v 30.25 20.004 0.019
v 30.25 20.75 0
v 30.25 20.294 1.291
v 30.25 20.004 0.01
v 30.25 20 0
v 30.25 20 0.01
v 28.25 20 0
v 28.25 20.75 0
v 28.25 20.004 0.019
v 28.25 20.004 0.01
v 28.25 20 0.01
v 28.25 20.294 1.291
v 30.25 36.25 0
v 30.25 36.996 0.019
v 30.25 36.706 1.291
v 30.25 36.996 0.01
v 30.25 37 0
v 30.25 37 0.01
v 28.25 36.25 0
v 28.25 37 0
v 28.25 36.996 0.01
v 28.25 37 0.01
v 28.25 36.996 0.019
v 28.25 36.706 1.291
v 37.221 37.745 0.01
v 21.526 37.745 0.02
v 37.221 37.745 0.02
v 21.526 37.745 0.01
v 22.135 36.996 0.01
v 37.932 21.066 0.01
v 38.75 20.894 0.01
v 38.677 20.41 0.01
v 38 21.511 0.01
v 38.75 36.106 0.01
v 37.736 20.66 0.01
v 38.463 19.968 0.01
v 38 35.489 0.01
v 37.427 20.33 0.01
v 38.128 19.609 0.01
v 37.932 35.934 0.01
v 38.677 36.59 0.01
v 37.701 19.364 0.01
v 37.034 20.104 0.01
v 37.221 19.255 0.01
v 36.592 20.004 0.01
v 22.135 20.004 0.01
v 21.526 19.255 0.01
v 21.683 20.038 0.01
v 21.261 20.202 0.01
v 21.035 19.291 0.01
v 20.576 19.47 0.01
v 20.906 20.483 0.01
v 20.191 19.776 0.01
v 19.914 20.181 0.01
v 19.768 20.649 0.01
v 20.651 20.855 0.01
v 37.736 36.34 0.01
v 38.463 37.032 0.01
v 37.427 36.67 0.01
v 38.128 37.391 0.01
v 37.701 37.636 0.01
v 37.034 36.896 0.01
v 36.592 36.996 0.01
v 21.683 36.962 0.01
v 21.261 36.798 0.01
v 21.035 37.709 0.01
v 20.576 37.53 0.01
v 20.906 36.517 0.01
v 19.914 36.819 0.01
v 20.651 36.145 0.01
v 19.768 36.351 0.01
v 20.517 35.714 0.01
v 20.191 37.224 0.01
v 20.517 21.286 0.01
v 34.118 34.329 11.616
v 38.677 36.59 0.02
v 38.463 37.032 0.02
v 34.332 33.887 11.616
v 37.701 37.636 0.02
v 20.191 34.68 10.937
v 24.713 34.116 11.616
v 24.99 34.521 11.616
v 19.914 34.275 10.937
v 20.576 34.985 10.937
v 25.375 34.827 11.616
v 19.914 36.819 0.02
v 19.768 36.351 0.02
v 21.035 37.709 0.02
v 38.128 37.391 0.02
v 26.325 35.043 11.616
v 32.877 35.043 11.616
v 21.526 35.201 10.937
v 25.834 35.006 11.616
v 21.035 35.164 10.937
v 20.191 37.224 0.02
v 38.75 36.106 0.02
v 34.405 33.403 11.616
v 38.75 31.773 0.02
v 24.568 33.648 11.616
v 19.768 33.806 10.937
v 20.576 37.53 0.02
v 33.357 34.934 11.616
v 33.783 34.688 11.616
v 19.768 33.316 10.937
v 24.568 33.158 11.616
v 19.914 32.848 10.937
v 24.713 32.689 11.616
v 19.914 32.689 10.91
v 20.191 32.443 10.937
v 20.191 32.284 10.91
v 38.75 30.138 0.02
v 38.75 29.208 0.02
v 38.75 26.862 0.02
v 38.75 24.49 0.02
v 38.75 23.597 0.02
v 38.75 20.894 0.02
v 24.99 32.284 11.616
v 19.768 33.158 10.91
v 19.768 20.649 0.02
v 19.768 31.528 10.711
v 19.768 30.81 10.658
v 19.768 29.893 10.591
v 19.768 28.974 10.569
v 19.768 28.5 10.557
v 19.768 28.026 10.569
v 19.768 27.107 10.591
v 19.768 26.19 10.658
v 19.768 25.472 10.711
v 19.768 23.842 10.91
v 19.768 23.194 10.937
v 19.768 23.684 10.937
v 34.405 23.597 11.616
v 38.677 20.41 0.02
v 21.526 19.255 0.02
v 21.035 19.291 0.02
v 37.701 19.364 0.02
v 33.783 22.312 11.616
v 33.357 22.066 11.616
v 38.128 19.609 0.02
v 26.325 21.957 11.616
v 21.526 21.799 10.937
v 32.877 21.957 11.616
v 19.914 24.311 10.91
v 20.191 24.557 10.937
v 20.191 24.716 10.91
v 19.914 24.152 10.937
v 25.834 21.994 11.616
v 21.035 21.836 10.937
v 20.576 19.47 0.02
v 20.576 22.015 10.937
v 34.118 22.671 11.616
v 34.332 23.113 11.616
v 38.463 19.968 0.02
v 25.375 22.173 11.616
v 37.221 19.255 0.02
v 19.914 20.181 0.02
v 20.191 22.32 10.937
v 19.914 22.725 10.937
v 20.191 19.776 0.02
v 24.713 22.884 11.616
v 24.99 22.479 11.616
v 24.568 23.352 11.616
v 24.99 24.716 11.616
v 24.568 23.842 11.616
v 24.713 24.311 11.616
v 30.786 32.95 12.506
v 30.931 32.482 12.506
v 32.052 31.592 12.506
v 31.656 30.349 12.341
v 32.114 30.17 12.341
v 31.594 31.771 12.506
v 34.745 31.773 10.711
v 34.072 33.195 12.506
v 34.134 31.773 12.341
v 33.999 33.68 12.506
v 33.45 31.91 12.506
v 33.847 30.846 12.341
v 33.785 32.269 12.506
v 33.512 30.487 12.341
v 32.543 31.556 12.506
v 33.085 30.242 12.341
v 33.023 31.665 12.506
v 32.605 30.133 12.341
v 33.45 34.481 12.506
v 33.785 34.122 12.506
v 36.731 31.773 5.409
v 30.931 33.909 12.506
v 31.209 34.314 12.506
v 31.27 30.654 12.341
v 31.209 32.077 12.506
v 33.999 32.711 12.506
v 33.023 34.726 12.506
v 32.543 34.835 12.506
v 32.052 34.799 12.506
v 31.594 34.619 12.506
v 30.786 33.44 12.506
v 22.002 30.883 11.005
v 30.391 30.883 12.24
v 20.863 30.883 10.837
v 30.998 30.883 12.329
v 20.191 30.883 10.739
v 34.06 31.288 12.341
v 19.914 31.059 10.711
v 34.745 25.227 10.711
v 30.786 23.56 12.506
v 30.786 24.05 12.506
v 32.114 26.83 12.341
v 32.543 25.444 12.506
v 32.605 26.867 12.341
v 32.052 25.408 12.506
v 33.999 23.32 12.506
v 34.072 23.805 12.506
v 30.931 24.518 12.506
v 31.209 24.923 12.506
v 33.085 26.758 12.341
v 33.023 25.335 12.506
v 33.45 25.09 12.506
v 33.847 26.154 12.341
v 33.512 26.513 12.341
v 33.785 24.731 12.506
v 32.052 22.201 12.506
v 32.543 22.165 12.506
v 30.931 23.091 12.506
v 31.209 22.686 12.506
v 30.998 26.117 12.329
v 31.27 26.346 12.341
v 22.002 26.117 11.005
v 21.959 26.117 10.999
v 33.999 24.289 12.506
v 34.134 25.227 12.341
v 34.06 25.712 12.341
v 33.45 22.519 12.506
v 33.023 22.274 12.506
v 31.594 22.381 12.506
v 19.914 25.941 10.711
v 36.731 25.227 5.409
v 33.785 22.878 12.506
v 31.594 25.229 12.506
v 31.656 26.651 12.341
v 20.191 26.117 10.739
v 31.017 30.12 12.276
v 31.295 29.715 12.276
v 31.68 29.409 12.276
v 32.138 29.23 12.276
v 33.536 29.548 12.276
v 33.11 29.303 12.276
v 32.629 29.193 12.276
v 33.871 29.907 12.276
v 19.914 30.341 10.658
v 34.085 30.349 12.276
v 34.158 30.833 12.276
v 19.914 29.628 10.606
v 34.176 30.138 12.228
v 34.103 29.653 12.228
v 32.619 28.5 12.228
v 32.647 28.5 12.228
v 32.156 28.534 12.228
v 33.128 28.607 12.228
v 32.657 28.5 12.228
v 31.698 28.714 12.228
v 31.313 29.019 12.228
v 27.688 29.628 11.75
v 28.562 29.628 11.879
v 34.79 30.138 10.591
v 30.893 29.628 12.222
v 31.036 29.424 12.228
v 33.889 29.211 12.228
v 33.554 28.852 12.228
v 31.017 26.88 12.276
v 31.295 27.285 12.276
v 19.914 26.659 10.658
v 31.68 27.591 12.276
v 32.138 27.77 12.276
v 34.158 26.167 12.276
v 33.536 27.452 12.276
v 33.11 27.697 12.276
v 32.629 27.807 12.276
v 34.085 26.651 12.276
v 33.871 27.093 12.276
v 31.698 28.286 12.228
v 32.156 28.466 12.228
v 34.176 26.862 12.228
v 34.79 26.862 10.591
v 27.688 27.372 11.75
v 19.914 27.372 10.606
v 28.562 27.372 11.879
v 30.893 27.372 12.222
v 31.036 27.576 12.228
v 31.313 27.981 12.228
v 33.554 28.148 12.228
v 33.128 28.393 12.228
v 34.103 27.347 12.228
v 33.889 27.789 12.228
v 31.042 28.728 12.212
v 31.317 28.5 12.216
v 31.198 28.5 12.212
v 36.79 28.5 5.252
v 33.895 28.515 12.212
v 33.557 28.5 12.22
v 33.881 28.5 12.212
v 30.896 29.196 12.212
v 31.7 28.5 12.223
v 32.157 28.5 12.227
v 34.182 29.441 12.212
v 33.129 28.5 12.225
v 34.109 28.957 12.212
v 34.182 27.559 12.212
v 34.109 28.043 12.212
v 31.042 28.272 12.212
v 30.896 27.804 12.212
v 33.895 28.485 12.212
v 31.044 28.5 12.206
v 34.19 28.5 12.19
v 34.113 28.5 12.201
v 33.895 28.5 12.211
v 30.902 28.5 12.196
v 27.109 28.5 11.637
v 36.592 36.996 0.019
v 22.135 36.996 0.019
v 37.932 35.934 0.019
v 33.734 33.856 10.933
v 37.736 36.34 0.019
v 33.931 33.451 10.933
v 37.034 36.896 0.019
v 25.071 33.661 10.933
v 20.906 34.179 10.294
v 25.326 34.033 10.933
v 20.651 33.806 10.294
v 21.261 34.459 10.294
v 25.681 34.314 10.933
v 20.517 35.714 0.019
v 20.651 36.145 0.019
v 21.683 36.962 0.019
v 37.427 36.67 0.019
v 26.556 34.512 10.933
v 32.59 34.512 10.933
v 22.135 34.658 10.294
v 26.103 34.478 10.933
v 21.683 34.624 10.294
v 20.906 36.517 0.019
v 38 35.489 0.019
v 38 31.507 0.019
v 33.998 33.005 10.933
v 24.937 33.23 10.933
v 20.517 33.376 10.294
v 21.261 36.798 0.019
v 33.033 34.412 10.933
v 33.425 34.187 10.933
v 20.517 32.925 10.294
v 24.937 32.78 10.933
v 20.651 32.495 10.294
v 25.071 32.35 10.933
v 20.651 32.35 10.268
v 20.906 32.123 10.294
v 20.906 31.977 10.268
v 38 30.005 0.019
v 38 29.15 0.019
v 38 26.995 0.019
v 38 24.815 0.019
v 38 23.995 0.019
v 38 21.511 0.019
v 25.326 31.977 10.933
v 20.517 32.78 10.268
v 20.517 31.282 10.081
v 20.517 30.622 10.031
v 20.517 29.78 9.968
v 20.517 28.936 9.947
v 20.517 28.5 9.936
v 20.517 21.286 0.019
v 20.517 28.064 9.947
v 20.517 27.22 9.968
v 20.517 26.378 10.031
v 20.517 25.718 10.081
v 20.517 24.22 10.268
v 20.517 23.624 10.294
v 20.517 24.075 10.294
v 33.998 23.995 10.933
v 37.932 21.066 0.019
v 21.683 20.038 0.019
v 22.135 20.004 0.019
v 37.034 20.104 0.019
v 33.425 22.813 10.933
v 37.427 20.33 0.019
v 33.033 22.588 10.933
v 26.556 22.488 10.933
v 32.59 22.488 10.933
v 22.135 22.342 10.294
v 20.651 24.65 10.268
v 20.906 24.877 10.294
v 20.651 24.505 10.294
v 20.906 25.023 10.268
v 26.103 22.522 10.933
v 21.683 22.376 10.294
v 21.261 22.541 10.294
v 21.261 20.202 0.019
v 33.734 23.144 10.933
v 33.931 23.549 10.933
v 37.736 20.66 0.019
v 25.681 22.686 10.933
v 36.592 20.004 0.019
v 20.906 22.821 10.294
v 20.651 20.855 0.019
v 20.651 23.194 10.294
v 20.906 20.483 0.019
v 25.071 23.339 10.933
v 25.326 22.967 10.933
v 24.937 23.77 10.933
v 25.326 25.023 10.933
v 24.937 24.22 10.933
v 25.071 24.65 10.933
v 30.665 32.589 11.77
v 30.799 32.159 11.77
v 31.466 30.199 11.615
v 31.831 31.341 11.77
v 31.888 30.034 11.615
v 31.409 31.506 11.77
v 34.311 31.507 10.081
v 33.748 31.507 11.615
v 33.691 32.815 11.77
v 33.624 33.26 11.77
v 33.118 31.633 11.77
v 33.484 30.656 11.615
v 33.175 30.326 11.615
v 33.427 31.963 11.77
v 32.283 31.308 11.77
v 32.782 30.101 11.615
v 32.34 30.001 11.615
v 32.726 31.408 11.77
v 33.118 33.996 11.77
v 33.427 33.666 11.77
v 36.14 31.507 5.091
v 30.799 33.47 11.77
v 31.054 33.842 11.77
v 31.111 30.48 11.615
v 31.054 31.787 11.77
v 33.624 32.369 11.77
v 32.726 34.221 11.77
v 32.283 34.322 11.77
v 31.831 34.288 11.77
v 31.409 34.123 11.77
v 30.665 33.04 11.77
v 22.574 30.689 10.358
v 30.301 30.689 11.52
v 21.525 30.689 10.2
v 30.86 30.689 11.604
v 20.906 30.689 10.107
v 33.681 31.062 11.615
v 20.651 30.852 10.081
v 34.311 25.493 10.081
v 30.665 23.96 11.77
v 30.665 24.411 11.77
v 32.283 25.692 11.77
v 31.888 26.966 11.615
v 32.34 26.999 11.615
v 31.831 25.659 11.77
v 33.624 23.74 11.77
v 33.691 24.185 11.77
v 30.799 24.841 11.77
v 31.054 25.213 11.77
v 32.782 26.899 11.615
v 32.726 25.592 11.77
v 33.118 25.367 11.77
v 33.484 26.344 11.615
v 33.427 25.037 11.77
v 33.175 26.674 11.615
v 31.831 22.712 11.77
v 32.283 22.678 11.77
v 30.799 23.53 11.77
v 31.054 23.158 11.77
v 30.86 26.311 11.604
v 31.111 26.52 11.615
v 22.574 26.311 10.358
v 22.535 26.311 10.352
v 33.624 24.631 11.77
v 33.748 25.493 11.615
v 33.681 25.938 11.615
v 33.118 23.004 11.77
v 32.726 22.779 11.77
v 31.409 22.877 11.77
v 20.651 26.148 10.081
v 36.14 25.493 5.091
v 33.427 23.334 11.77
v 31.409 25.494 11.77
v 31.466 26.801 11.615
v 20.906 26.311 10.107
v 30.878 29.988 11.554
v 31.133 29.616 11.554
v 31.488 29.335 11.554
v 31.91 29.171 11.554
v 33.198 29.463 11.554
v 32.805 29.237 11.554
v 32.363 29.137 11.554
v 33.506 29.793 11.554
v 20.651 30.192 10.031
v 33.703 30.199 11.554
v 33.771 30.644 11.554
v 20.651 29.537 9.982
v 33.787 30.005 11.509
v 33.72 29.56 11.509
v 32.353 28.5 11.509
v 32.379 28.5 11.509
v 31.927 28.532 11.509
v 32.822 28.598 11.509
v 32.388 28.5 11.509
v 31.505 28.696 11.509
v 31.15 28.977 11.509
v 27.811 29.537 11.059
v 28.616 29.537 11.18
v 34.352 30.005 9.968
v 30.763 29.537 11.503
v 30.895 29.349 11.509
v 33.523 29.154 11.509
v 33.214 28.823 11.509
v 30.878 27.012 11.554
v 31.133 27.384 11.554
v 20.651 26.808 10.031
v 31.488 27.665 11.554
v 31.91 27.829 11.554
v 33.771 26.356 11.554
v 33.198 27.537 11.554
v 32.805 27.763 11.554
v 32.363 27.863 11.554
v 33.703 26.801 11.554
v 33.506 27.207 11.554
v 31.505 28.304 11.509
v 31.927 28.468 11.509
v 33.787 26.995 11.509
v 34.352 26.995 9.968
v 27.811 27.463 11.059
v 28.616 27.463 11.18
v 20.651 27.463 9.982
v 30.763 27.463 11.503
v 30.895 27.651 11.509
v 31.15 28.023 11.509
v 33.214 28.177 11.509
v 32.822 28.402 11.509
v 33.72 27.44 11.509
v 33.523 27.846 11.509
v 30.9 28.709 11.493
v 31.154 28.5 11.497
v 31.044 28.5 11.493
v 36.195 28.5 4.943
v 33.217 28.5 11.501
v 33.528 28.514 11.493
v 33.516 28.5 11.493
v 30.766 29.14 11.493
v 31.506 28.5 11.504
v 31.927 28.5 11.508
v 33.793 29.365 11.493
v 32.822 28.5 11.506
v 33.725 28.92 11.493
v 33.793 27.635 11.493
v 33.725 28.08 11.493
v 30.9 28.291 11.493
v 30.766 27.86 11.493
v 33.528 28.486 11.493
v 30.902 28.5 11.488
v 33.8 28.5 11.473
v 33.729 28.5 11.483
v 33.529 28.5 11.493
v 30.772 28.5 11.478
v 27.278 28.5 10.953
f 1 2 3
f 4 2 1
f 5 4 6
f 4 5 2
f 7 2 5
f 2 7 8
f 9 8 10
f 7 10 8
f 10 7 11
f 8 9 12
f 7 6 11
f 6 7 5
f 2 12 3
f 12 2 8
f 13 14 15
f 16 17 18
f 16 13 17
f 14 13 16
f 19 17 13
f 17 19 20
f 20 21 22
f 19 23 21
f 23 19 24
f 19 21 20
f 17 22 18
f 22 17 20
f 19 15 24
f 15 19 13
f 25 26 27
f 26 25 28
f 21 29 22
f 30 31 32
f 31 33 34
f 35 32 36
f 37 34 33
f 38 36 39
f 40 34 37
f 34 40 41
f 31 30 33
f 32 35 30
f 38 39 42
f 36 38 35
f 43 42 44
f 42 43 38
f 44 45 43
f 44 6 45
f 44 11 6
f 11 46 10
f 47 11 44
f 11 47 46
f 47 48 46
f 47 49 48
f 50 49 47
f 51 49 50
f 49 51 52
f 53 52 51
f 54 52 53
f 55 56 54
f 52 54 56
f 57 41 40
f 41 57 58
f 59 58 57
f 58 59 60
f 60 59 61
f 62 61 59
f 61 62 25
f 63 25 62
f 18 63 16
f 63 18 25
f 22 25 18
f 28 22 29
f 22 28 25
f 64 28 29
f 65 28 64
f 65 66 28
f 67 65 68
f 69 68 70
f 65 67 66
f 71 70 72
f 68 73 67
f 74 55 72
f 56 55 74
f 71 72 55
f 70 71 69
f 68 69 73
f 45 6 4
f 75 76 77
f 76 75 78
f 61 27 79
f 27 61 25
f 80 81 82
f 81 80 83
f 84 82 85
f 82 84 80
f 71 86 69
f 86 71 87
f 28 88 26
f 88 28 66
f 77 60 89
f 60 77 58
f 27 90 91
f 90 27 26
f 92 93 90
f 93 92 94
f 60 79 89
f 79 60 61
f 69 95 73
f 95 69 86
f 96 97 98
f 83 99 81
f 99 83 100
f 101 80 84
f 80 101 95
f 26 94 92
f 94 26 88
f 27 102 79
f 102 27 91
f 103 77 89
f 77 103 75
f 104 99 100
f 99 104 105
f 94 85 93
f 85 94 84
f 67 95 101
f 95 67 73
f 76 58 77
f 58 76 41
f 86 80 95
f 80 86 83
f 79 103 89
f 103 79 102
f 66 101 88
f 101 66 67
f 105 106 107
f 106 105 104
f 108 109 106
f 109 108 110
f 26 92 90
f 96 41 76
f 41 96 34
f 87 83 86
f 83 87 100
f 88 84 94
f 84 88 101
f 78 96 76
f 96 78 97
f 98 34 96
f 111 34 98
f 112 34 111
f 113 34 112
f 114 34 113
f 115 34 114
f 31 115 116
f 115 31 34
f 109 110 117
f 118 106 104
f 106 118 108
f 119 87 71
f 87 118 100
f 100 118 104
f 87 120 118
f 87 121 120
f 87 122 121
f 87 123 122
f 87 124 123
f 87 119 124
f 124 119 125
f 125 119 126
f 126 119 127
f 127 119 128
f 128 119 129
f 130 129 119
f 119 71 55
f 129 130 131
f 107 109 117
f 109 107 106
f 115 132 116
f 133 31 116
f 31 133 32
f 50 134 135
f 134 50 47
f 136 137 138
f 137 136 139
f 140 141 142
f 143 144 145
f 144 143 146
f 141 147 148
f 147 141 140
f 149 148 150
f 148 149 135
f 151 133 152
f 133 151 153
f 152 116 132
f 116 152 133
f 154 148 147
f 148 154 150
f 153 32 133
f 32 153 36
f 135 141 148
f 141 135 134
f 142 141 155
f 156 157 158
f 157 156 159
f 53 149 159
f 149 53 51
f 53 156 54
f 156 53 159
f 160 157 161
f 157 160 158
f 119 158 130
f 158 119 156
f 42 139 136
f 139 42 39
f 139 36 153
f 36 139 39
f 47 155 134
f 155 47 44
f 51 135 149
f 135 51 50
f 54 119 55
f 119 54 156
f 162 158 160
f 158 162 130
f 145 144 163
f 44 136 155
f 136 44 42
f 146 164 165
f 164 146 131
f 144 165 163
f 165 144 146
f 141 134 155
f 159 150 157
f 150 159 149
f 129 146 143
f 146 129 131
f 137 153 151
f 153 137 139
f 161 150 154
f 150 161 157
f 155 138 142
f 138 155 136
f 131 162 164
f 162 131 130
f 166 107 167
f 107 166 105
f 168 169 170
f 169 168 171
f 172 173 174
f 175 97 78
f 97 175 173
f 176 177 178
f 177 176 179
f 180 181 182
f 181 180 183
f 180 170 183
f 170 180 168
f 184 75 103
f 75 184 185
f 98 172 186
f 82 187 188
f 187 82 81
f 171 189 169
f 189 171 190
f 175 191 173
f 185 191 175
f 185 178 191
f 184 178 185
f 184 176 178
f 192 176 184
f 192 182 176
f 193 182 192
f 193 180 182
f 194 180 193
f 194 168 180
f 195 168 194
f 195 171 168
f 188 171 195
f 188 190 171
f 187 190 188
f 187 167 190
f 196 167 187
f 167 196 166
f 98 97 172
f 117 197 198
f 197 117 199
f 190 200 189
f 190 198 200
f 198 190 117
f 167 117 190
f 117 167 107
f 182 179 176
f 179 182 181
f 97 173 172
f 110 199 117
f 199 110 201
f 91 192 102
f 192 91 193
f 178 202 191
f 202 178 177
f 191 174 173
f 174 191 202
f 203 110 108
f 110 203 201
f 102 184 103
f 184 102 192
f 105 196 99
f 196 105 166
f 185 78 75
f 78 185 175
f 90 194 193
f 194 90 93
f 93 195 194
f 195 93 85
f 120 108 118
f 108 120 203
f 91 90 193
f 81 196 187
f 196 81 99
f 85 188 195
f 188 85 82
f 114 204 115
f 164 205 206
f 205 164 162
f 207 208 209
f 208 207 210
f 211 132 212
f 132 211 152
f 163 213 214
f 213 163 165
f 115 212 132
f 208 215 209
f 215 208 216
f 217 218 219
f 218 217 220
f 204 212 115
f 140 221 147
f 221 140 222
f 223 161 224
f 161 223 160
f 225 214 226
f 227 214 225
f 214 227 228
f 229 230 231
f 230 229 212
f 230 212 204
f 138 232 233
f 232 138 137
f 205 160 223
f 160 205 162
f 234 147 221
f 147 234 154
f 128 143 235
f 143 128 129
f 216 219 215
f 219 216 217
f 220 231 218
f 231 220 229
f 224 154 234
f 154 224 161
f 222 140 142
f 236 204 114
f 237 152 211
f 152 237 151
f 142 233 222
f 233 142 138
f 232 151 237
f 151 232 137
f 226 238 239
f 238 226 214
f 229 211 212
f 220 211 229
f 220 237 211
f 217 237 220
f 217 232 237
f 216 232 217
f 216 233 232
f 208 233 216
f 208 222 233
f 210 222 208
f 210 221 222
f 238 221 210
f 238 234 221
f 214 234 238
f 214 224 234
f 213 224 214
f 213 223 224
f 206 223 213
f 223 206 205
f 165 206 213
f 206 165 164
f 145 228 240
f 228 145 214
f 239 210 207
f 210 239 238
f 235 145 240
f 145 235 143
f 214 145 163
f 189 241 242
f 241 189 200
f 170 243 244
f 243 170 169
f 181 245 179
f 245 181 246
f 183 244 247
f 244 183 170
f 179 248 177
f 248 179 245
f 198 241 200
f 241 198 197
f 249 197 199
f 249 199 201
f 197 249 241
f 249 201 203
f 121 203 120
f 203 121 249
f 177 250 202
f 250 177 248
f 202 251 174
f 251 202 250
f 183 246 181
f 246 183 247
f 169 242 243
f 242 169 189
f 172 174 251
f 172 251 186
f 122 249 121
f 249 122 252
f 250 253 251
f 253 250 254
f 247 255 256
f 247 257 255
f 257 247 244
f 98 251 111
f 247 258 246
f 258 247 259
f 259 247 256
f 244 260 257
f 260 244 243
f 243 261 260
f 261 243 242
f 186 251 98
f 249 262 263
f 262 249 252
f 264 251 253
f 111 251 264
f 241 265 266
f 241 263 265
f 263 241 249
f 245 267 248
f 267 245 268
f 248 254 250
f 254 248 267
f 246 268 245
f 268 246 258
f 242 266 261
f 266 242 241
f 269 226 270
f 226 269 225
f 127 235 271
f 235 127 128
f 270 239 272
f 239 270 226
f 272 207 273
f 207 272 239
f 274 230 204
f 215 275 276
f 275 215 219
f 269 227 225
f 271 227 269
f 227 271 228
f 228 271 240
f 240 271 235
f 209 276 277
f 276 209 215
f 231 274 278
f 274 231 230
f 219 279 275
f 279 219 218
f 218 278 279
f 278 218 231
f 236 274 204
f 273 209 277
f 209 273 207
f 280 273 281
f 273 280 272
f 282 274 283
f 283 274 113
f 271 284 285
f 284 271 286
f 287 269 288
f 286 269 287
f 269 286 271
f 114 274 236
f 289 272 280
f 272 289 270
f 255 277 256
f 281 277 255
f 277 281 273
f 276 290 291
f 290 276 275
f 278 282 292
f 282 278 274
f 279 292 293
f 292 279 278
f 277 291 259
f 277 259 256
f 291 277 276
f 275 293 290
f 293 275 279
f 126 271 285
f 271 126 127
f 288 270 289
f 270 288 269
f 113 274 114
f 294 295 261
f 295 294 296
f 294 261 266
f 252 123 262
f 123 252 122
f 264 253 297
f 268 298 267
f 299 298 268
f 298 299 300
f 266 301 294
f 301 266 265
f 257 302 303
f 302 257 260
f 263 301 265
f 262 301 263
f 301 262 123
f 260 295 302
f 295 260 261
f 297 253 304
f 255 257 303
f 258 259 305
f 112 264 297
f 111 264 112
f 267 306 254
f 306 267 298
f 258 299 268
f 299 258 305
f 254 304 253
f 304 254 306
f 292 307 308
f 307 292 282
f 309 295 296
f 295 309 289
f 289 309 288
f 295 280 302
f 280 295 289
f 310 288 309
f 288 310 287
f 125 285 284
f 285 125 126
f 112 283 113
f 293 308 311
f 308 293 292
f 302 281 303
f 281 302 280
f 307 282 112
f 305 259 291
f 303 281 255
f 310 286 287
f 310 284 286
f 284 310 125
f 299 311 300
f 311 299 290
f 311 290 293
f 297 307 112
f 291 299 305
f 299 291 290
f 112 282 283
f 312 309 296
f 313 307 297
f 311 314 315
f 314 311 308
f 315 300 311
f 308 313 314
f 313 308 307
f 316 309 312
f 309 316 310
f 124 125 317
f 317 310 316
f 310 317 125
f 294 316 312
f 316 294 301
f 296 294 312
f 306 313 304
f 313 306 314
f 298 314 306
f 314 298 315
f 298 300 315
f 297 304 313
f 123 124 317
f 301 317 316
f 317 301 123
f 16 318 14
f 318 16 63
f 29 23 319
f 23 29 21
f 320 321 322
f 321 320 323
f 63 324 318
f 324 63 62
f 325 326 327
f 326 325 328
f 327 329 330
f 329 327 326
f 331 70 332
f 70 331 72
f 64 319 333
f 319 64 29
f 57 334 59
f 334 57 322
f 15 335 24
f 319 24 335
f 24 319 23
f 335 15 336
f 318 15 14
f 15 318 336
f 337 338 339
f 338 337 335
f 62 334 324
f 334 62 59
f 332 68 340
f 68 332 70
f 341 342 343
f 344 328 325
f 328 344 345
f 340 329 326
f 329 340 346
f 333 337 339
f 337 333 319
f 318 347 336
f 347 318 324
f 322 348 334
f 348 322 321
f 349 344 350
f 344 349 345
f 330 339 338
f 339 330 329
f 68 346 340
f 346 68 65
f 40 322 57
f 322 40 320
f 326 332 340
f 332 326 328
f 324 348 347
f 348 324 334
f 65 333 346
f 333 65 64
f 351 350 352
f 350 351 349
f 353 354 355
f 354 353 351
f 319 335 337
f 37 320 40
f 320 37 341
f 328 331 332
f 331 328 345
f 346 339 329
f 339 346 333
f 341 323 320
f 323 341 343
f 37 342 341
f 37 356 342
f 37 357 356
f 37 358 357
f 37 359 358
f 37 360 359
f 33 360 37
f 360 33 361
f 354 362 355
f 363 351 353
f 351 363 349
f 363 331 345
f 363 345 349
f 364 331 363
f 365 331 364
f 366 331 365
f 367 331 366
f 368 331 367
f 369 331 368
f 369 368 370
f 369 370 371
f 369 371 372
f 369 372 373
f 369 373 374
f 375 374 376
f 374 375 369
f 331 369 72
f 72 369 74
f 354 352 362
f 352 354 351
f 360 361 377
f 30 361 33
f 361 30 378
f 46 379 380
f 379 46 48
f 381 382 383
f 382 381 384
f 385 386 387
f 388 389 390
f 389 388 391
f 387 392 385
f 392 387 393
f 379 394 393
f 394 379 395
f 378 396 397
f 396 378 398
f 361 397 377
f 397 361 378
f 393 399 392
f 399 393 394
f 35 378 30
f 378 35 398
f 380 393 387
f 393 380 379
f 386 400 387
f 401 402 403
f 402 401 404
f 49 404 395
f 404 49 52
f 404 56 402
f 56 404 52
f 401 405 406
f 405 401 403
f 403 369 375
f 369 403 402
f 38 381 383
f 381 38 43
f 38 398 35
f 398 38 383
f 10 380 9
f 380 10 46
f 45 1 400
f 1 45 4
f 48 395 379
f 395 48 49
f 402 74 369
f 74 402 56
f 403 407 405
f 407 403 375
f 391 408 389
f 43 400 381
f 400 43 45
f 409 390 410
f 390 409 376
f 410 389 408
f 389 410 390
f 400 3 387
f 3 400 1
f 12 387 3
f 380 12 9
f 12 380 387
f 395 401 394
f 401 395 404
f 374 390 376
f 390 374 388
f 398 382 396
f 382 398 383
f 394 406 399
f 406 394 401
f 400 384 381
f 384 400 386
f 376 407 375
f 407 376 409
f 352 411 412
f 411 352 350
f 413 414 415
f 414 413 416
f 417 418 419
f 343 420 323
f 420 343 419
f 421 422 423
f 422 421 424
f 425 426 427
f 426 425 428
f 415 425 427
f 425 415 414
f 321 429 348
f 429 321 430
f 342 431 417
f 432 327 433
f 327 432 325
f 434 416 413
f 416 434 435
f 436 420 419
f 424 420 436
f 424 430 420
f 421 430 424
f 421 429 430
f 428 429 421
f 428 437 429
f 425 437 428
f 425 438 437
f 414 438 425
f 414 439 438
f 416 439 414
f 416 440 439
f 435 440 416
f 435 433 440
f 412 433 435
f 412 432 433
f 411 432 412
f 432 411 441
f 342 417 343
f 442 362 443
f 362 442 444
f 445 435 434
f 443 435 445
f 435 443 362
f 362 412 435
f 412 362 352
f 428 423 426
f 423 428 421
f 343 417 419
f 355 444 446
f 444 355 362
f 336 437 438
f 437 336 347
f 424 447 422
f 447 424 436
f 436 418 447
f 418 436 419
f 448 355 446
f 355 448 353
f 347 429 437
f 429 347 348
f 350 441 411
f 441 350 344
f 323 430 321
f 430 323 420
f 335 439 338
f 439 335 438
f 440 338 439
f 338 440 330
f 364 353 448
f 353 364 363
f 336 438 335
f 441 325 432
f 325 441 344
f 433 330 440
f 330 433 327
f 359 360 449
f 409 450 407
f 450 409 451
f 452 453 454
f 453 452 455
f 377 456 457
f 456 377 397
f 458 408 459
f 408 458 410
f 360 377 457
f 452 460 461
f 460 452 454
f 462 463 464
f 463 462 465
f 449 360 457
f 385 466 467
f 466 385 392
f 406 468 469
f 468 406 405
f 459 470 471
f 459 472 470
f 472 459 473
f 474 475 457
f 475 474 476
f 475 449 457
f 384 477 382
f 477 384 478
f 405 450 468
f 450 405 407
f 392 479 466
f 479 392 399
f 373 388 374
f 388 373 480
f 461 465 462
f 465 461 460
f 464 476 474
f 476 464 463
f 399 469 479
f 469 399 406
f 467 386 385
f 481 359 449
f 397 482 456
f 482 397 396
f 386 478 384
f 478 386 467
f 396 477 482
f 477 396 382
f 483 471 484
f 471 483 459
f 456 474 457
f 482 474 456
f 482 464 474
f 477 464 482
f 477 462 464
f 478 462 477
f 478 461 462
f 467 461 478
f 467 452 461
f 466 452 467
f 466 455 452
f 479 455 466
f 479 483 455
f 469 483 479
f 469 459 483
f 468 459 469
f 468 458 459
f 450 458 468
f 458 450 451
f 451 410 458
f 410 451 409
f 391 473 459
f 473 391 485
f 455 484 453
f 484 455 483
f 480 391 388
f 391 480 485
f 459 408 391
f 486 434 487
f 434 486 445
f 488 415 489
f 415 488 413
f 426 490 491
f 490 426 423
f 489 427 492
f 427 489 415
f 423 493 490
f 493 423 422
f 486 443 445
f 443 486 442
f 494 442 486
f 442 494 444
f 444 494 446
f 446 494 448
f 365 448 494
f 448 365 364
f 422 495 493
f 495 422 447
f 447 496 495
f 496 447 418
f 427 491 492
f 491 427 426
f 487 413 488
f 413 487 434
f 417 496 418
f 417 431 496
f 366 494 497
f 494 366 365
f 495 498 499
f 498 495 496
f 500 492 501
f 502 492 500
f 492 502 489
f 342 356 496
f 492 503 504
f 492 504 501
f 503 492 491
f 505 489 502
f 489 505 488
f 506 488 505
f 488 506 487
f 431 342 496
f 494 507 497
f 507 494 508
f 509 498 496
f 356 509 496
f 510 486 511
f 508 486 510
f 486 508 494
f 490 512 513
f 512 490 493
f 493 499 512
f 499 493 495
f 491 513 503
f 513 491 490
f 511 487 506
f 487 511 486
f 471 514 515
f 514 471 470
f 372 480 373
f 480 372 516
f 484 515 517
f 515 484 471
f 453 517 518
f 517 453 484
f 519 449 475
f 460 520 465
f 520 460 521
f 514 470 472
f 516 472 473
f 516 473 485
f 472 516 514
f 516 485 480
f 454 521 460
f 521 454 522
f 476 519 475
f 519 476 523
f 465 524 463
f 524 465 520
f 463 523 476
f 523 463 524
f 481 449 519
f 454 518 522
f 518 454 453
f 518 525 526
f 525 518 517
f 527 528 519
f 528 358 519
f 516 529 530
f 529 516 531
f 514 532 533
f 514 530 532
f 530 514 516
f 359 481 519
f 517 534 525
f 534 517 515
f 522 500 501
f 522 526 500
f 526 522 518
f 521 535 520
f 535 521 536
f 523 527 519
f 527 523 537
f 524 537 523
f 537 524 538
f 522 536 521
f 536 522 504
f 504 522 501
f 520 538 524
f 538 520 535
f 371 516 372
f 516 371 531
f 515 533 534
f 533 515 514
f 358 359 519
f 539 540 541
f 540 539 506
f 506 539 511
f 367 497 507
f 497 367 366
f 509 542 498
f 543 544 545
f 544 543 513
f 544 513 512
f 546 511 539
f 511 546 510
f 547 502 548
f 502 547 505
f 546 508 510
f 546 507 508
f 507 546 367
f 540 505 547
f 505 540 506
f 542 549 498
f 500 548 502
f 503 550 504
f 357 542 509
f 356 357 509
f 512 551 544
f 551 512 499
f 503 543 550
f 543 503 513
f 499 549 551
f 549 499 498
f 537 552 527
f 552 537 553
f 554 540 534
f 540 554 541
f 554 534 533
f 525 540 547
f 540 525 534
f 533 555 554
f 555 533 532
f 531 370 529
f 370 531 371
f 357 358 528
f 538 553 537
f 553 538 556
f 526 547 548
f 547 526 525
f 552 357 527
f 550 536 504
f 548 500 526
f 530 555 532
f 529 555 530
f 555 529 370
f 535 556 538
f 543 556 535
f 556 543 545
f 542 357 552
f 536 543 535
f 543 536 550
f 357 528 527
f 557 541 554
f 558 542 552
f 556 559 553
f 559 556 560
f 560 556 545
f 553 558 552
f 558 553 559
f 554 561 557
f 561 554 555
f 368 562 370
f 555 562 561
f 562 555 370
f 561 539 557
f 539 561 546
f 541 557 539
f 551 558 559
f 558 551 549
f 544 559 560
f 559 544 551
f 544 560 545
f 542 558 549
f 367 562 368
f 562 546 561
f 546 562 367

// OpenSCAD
//measures are in millimeters
AY=18.5;
AX=19.0;
BY=12.5;
BLX=14.5;
EZ=11.0;
FLZ=14.0;
H=12.75;
CYL_OFF_Z=50;
CYL_DEPTH=0.1;
CLIP_X=2;
CLIP_Y=0.75;
CLIP_H=3*CLIP_Y;
CORNER_RADIUS=2;

WallThickness=0.75;
ClipWidth=2.2;
ClipDepth=0.75;

//ascfront=FLZ/sqrt(pow(FLZ,2)-pow(H,2));
//asctop=(H-EZ)/sqrt(pow(BLX,2)-pow((H-EZ),2));

alpha=asin((H-EZ)/BLX);
beta=asin(H/FLZ);
gamma=90-asin((0.5*(AY-BY))/EZ);

module keycap(){
	scale([AX/(AX+2*CORNER_RADIUS),AY/(AY+2*CORNER_RADIUS),1])
	translate([CORNER_RADIUS,CORNER_RADIUS,0.01])
	minkowski(){
		difference(){
			cube([AX,AY,H]);
			rotate(a=gamma,v=[1,0,0]) cube([100,100,100]);
			translate([0,AY,0]) rotate(a=90-gamma,v=[1,0,0]) cube([100,100,100]);
			translate([0,0,EZ]) rotate(a=-alpha,v=[0,1,0]) translate([-50,0,0]) cube([100,100,100]);
			translate([0,AY/2,EZ+CYL_OFF_Z]) rotate(a=90-alpha,v=[0,1,0]) cylinder(h=100,center=true,r=CYL_OFF_Z+CYL_DEPTH,$fa=1);
			translate([AX,0,0]) rotate(a=beta-90,v=[0,1,0]) cube([100,100,100]);
		}
		cylinder(h=0.01,r=CORNER_RADIUS,$fs=0.6);
		//rotate(a=90,v=[1,0,0]) cylinder(h=0.01,r=1,$fs=0.3);
	}
}

module clip(){
	difference(){
		cube([CLIP_X,CLIP_Y,CLIP_H]);
		translate([0,CLIP_Y,0]) rotate(a=asin(CLIP_Y/CLIP_H),v=[1,0,0]) cube([100,100,100]);
	}
}

i=1;
j=1;
translate([i*(AX+WallThickness),j*(AY+WallThickness),0]){

translate([(AX-CLIP_X)/2,WallThickness,0]) clip();
translate([0,AY,0]) mirror([0,1,0]) translate([(AX-CLIP_X)/2,WallThickness,0]) clip();

difference(){
	keycap();
	translate([WallThickness, WallThickness, 0]) scale(v=[1-2*WallThickness/AX, 1-2*WallThickness/AY, 1-WallThickness/H]) keycap();
}
}
